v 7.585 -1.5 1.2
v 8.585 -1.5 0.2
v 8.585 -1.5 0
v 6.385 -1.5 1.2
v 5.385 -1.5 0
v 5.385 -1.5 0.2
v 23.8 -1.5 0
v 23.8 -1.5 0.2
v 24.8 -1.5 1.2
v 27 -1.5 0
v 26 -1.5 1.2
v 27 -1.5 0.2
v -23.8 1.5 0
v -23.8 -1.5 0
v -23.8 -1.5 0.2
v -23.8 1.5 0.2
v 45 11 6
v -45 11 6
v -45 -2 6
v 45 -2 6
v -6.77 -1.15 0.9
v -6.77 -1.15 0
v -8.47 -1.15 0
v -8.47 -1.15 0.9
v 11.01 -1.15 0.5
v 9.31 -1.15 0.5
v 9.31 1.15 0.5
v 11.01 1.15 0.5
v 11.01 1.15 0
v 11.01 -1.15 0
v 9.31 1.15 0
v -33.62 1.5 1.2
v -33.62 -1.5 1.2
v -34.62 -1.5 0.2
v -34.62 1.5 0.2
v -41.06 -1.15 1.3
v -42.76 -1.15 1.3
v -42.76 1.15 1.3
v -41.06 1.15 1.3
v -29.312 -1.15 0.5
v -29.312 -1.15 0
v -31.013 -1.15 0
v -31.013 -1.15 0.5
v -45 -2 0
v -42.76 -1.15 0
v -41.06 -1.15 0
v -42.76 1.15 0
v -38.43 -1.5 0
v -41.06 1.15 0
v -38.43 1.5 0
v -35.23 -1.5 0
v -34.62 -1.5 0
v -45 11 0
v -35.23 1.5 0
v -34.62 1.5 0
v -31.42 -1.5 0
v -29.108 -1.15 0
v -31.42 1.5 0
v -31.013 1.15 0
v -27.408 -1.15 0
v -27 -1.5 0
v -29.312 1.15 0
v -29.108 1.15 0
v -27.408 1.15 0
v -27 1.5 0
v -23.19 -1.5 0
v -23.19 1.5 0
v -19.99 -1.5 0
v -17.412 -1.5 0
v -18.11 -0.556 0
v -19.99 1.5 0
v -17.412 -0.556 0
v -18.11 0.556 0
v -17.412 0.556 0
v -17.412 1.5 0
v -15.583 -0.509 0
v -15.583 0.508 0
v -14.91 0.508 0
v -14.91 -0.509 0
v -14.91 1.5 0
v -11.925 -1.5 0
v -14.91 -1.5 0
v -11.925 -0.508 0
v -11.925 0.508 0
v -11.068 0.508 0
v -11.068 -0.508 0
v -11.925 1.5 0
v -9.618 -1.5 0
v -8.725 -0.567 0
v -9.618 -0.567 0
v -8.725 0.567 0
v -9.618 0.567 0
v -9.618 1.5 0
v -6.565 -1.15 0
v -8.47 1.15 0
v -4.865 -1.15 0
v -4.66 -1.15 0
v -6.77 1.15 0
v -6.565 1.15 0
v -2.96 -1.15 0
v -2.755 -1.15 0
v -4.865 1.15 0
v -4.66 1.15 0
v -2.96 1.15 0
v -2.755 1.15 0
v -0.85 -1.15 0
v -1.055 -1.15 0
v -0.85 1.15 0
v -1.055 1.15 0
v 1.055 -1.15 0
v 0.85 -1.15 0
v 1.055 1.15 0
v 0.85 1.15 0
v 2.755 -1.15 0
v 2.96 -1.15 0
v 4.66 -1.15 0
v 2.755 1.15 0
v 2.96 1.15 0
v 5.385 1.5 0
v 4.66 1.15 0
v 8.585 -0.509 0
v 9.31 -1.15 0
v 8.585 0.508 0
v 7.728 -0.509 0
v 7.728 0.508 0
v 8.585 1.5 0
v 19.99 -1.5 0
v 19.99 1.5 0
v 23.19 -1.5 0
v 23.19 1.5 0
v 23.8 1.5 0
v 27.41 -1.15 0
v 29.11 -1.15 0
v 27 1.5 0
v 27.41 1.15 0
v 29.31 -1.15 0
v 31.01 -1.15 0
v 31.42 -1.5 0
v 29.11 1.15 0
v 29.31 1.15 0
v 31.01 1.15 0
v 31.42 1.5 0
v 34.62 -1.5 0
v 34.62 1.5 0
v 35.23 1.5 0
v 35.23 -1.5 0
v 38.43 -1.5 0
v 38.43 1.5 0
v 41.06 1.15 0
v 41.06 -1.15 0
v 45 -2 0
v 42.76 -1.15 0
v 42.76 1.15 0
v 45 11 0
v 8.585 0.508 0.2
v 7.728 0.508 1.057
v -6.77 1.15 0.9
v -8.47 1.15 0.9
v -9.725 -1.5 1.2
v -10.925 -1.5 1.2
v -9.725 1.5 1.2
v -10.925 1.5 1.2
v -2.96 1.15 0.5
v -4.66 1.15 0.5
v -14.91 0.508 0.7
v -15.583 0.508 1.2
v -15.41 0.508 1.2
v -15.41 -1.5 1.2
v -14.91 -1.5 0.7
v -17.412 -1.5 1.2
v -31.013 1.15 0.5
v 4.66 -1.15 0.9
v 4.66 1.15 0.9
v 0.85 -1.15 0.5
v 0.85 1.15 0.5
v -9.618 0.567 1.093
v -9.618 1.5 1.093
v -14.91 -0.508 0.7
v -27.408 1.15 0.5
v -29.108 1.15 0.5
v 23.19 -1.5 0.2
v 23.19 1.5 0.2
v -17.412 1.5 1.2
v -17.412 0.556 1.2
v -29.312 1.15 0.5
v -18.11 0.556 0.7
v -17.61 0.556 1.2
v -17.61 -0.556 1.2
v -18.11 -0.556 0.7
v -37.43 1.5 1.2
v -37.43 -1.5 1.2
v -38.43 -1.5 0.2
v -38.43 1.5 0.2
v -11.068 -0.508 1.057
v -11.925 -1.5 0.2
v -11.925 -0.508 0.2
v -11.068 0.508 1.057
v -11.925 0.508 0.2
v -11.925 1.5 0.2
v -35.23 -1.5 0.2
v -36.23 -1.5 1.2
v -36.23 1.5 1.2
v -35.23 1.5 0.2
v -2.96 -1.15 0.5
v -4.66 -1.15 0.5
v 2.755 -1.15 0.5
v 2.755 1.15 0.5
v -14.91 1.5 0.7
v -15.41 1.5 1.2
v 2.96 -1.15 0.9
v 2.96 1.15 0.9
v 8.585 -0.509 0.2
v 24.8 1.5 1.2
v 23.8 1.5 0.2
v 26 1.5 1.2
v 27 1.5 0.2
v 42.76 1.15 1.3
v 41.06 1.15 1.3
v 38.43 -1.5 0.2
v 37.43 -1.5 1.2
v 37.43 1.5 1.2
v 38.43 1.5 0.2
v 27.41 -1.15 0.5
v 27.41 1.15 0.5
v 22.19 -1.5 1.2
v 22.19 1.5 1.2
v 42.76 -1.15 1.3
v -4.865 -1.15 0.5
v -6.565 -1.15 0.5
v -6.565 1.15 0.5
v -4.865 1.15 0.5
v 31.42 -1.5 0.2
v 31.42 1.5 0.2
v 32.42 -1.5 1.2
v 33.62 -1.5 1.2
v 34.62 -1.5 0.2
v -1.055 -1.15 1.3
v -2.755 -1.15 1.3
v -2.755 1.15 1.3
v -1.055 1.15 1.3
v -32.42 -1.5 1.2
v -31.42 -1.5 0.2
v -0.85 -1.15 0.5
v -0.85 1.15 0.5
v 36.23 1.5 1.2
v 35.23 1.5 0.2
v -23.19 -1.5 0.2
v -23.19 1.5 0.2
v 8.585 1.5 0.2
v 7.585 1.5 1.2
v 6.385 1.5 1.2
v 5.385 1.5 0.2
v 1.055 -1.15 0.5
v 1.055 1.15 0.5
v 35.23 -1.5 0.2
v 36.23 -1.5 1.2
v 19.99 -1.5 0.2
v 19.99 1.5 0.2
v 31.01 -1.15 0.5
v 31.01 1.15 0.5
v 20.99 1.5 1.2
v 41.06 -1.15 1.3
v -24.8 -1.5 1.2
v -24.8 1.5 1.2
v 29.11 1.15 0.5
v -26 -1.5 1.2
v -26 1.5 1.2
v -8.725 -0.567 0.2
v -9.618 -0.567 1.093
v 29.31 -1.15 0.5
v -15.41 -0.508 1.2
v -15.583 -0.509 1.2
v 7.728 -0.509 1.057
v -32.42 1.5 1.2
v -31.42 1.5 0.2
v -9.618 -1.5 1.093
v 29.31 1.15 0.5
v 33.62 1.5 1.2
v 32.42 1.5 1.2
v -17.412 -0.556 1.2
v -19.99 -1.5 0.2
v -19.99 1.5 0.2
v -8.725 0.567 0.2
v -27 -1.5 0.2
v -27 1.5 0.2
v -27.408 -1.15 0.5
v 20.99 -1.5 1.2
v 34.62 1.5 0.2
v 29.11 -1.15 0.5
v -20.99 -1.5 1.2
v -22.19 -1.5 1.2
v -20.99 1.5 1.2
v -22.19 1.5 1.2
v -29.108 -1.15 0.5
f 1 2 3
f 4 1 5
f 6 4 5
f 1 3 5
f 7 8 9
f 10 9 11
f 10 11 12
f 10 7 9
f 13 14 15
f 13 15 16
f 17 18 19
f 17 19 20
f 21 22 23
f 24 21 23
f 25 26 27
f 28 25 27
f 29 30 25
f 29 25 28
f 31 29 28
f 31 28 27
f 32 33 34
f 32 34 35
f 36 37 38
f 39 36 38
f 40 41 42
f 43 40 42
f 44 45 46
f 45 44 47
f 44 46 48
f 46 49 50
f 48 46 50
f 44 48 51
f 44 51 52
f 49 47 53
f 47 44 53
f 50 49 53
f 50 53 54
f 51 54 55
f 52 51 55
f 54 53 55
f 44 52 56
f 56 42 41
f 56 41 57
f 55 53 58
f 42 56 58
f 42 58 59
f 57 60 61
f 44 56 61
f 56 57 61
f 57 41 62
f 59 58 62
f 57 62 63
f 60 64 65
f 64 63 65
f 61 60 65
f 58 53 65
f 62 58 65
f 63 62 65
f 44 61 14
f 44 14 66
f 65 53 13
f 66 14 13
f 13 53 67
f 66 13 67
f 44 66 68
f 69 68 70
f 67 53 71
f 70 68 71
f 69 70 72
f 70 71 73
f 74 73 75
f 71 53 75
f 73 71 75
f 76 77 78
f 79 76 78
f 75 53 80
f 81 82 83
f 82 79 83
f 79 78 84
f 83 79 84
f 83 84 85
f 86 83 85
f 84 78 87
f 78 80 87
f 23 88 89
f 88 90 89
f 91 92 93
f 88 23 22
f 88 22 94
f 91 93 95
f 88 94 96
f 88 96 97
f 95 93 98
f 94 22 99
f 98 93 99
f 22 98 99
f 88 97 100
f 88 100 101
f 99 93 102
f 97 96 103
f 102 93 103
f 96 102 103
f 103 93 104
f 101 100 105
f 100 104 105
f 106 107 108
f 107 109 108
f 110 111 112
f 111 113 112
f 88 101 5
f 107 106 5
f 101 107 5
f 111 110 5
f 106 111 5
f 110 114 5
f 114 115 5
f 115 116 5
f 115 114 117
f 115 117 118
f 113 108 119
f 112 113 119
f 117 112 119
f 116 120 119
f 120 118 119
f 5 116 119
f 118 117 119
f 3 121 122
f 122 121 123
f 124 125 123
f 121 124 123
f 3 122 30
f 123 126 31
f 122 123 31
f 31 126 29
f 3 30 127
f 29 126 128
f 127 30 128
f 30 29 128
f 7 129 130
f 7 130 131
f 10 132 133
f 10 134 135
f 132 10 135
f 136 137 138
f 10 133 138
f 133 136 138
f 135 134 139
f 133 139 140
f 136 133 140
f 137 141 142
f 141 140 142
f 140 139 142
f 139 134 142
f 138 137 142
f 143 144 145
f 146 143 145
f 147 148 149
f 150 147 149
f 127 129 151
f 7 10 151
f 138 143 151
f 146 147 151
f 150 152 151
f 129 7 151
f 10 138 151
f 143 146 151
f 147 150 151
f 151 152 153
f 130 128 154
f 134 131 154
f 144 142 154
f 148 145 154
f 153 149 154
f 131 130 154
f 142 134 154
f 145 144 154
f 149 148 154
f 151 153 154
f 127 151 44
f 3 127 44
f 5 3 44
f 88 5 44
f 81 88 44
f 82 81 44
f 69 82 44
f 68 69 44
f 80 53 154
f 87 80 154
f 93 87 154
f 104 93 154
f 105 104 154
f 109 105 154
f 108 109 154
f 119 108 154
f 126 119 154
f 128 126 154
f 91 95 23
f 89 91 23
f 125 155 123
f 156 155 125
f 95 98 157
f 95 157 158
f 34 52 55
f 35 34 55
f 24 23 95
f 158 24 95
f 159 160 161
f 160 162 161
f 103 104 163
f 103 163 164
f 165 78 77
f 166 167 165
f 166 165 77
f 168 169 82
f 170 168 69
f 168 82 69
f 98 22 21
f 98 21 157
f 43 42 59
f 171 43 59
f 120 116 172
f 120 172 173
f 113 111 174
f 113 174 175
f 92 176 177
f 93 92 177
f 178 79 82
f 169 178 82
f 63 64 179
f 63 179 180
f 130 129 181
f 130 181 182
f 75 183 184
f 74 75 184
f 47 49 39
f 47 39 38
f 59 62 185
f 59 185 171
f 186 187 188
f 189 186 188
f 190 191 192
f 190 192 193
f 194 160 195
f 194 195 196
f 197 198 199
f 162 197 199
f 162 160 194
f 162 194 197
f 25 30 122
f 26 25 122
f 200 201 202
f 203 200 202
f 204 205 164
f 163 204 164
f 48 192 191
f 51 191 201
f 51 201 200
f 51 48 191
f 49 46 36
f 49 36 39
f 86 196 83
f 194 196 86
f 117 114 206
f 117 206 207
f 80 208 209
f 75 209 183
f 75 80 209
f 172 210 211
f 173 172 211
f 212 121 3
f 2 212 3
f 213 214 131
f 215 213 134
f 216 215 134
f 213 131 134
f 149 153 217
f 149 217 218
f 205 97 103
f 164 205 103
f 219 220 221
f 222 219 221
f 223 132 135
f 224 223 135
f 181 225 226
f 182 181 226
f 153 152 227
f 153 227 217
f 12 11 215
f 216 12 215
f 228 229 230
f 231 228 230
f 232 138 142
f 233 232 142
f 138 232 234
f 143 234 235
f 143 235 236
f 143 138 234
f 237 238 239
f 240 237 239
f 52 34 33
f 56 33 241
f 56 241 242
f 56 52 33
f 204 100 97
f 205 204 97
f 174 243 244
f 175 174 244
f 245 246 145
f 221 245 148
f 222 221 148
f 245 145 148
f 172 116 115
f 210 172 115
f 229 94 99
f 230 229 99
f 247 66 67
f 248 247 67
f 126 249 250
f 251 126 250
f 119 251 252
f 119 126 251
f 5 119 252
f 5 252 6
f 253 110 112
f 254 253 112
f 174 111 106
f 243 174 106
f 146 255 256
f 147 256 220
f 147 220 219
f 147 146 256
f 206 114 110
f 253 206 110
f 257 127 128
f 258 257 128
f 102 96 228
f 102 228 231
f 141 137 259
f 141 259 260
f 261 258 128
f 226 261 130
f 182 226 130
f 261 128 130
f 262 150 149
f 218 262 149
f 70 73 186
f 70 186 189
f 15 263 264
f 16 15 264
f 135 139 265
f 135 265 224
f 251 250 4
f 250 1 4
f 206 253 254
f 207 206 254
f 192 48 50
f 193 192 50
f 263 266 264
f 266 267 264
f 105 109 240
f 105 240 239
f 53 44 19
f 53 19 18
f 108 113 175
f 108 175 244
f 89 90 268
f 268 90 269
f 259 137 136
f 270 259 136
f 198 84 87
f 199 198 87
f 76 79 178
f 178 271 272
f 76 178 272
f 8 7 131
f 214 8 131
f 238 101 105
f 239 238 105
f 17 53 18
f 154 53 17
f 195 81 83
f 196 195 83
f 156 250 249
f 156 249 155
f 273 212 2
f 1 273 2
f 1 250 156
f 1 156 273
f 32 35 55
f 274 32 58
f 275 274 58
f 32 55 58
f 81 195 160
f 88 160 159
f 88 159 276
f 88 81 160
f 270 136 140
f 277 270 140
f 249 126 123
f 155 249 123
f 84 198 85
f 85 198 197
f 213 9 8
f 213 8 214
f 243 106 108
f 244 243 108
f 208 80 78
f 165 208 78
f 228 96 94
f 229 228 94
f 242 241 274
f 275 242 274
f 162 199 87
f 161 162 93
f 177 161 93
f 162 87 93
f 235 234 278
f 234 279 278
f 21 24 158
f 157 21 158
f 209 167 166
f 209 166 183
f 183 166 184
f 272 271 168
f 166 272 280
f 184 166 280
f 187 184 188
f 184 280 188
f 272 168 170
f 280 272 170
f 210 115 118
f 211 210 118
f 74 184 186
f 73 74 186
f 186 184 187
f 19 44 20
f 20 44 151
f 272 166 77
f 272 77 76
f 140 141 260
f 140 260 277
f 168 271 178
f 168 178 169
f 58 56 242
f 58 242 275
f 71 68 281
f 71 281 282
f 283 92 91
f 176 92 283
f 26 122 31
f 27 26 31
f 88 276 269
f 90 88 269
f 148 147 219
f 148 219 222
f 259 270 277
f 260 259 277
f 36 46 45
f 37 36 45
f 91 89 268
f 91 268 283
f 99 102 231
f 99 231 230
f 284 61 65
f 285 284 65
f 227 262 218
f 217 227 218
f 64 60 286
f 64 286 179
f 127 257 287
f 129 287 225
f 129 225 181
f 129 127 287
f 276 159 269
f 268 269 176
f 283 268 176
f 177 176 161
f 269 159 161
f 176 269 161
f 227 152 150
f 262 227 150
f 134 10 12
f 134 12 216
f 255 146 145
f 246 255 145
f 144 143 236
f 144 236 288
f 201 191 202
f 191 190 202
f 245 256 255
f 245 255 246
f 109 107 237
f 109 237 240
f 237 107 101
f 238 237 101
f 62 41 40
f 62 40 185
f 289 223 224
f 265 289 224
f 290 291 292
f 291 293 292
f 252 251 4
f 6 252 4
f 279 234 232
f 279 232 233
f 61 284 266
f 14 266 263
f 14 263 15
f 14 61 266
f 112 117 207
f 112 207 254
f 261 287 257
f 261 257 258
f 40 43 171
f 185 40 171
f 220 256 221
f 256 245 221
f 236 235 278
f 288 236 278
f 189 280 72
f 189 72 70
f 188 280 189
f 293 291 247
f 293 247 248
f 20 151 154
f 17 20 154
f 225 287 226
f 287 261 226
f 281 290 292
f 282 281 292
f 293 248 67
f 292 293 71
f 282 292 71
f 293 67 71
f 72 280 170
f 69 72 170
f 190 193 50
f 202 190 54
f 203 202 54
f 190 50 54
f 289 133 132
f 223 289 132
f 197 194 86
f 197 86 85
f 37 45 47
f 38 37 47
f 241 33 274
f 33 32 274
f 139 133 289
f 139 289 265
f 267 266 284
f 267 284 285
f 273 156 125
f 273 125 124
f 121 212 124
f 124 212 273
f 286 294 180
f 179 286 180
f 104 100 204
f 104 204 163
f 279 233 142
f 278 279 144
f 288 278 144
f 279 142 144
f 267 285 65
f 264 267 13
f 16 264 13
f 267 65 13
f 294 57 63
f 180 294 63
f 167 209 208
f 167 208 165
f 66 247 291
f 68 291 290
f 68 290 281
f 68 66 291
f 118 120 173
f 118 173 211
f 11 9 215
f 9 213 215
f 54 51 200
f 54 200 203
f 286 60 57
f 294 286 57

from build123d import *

# Parameters (mm, degrees)
SKETCH040_W             = 2.3
SKETCH040_H             = 1.7
PAD037_DEPTH            = 1.3
BODY038_PLACEMENT_ANGLE = 90
SKETCH031_W             = 3.2
SKETCH031_H             = 3
PAD028_DEPTH            = 1.2
CHAMFER014_SIZE         = 1
SKETCH030_W             = 3.2
SKETCH030_H             = 3
PAD027_DEPTH            = 1.2
CHAMFER013_SIZE         = 1
SKETCH037_W             = 2.3
SKETCH037_H             = 1.7
PAD034_DEPTH            = 0.5
BODY035_PLACEMENT_ANGLE = 90
SKETCH036_W             = 2.3
SKETCH036_H             = 1.7
PAD033_DEPTH            = 0.5
BODY034_PLACEMENT_ANGLE = 90
SKETCH028_W             = 3.2
SKETCH028_H             = 3
PAD025_DEPTH            = 1.2
CHAMFER011_SIZE         = 1
SKETCH029_W             = 3.2
SKETCH029_H             = 3
PAD026_DEPTH            = 1.2
CHAMFER012_SIZE         = 1
SKETCH054_W             = 3.2
SKETCH054_H             = 3
PAD049_DEPTH            = 1.2
CHAMFER021_SIZE         = 0.5
SKETCH055_W             = 1.850896
SKETCH055_H             = 1.017
SKETCH055_W_2           = 1.709498
SKETCH055_H_2           = 1.155216
POCKET005_DEPTH         = 5
BODY050_PLACEMENT_ANGLE = 180
SKETCH052_W             = 3.2
SKETCH052_H             = 3
PAD048_DEPTH            = 1.2
CHAMFER020_SIZE         = 1
SKETCH053_W             = 2.017963
SKETCH053_H             = 1.017
SKETCH053_W_2           = 1.827715
SKETCH053_H_2           = 1.155216
POCKET004_DEPTH         = 5
SKETCH048_W             = 2.3
SKETCH048_H             = 1.7
PAD045_DEPTH            = 0.9
BODY046_PLACEMENT_ANGLE = 90
SKETCH045_W             = 2.3
SKETCH045_H             = 1.7
PAD042_DEPTH            = 0.5
BODY043_PLACEMENT_ANGLE = 90
SKETCH044_W             = 2.3
SKETCH044_H             = 1.7
PAD041_DEPTH            = 0.5
BODY042_PLACEMENT_ANGLE = 90
SKETCH046_W             = 2.3
SKETCH046_H             = 1.7
PAD043_DEPTH            = 1.3
BODY044_PLACEMENT_ANGLE = 90
SKETCH049_W             = 2.3
SKETCH049_H             = 1.7
PAD046_DEPTH            = 0.9
BODY047_PLACEMENT_ANGLE = 90
SKETCH050_W             = 3.2
SKETCH050_H             = 3
PAD047_DEPTH            = 1.2
CHAMFER019_SIZE         = 1
SKETCH051_W             = 2.017963
SKETCH051_H             = 1.017
POCKET003_DEPTH         = 5
BODY048_PLACEMENT_ANGLE = 180
SKETCH042_W             = 2.3
SKETCH042_H             = 1.7
PAD039_DEPTH            = 0.5
BODY040_PLACEMENT_ANGLE = 90
SKETCH043_W             = 2.3
SKETCH043_H             = 1.7
PAD040_DEPTH            = 0.5
BODY041_PLACEMENT_ANGLE = 90
SKETCH047_W             = 2.3
SKETCH047_H             = 1.7
PAD044_DEPTH            = 0.5
BODY045_PLACEMENT_ANGLE = 90
SKETCH034_W             = 3.2
SKETCH034_H             = 3
PAD030_DEPTH            = 1.2
CHAMFER017_SIZE         = 1
SKETCH033_W             = 3.2
SKETCH033_H             = 3
PAD029_DEPTH            = 1.2
CHAMFER018_SIZE         = 1
SKETCH039_W             = 2.3
SKETCH039_H             = 1.7
PAD035_DEPTH            = 0.5
BODY037_PLACEMENT_ANGLE = 90
SKETCH038_W             = 2.3
SKETCH038_H             = 1.7
PAD036_DEPTH            = 0.5
BODY036_PLACEMENT_ANGLE = 90
SKETCH035_W             = 3.2
SKETCH035_H             = 3
PAD031_DEPTH            = 1.2
CHAMFER016_SIZE         = 1
SKETCH032_W             = 3.2
SKETCH032_H             = 3
PAD032_DEPTH            = 1.2
CHAMFER015_SIZE         = 1
SKETCH041_W             = 2.3
SKETCH041_H             = 1.7
PAD038_DEPTH            = 1.3
BODY039_PLACEMENT_ANGLE = 90
SKETCH056_W             = 90
SKETCH056_H             = 13
PAD050_DEPTH            = 6


with BuildPart() as capacitor_1u003:
    # Sketch040 → Pad037 (new body)
    with BuildSketch(Plane.XY):
        Rectangle(SKETCH040_W, SKETCH040_H)
    extrude(amount=PAD037_DEPTH)


with BuildPart() as capacitor_1u003_1:
    # Body038 placement: moved
    add(capacitor_1u003.part.moved(Location((-41.91, 0, 0))).rotate(Axis((-41.91, 0, 0), (0, 0, 1)), BODY038_PLACEMENT_ANGLE))


with BuildPart() as supersot017:
    # Sketch031 → Pad028 (new body)
    with BuildSketch(Plane.XY):
        Rectangle(SKETCH031_W, SKETCH031_H)
    extrude(amount=PAD028_DEPTH)

    # Chamfer014
    chamfer014_edges = [supersot017.edges().sort_by_distance(p)[0] for p in [
        (-1.6, 0, 1.2),
        (1.6, 0, 1.2),
    ]]
    chamfer(chamfer014_edges, length=CHAMFER014_SIZE)


with BuildPart() as supersot017_1:
    # Body029 placement: moved
    add(supersot017.part.moved(Location((-36.83, 0, 0))))


with BuildPart() as supersot016:
    # Sketch030 → Pad027 (new body)
    with BuildSketch(Plane.XY):
        Rectangle(SKETCH030_W, SKETCH030_H)
    extrude(amount=PAD027_DEPTH)

    # Chamfer013
    chamfer013_edges = [supersot016.edges().sort_by_distance(p)[0] for p in [
        (-1.6, 0, 1.2),
        (1.6, 0, 1.2),
    ]]
    chamfer(chamfer013_edges, length=CHAMFER013_SIZE)


with BuildPart() as supersot016_1:
    # Body028 placement: moved
    add(supersot016.part.moved(Location((-33.02, 0, 0))))


with BuildPart() as resistor_10k010:
    # Sketch037 → Pad034 (new body)
    with BuildSketch(Plane.XY):
        Rectangle(SKETCH037_W, SKETCH037_H)
    extrude(amount=PAD034_DEPTH)


with BuildPart() as resistor_10k010_1:
    # Body035 placement: moved
    add(resistor_10k010.part.moved(Location((-30.1625, 0, 0))).rotate(Axis((-30.1625, 0, 0), (0, 0, 1)), BODY035_PLACEMENT_ANGLE))


with BuildPart() as resistor_10k009:
    # Sketch036 → Pad033 (new body)
    with BuildSketch(Plane.XY):
        Rectangle(SKETCH036_W, SKETCH036_H)
    extrude(amount=PAD033_DEPTH)


with BuildPart() as resistor_10k009_1:
    # Body034 placement: moved
    add(resistor_10k009.part.moved(Location((-28.2575, 0, 0))).rotate(Axis((-28.2575, 0, 0), (0, 0, 1)), BODY034_PLACEMENT_ANGLE))


with BuildPart() as supersot014:
    # Sketch028 → Pad025 (new body)
    with BuildSketch(Plane.XY):
        Rectangle(SKETCH028_W, SKETCH028_H)
    extrude(amount=PAD025_DEPTH)

    # Chamfer011
    chamfer011_edges = [supersot014.edges().sort_by_distance(p)[0] for p in [
        (-1.6, 0, 1.2),
        (1.6, 0, 1.2),
    ]]
    chamfer(chamfer011_edges, length=CHAMFER011_SIZE)


with BuildPart() as supersot014_1:
    # Body026 placement: moved
    add(supersot014.part.moved(Location((-25.4, 0, 0))))


with BuildPart() as supersot015:
    # Sketch029 → Pad026 (new body)
    with BuildSketch(Plane.XY):
        Rectangle(SKETCH029_W, SKETCH029_H)
    extrude(amount=PAD026_DEPTH)

    # Chamfer012
    chamfer012_edges = [supersot015.edges().sort_by_distance(p)[0] for p in [
        (-1.6, 0, 1.2),
        (1.6, 0, 1.2),
    ]]
    chamfer(chamfer012_edges, length=CHAMFER012_SIZE)


with BuildPart() as supersot015_1:
    # Body027 placement: moved
    add(supersot015.part.moved(Location((-21.59, 0, 0))))


with BuildPart() as sot23_big001:
    # Sketch054 → Pad049 (new body)
    with BuildSketch(Plane.XY):
        Rectangle(SKETCH054_W, SKETCH054_H)
    extrude(amount=PAD049_DEPTH)

    # Chamfer021
    chamfer021_edges = [sot23_big001.edges().sort_by_distance(p)[0] for p in [
        (-1.6, 0, 1.2),
        (1.6, 0, 1.2),
    ]]
    chamfer(chamfer021_edges, length=CHAMFER021_SIZE)

    # Sketch055 (on Face5 of Chamfer021) → Pocket005 (cut)
    with BuildSketch(Plane.XY.offset(1.2)):
        with Locations((-1.851985, 0)):
            Rectangle(SKETCH055_W, SKETCH055_H)
        with Locations((1.75658, 1.133439)):
            Rectangle(SKETCH055_W_2, SKETCH055_H_2)
        with Locations((1.75658, -1.133439)):
            Rectangle(SKETCH055_W_2, SKETCH055_H_2)
    extrude(amount=-POCKET005_DEPTH, mode=Mode.SUBTRACT)


with BuildPart() as sot23_big001_1:
    # Body050 placement: moved
    add(sot23_big001.part.moved(Location((-16.51, 0, 0))).rotate(Axis((-16.51, 0, 0), (0, 0, 1)), BODY050_PLACEMENT_ANGLE))


with BuildPart() as sot23:
    # Sketch052 → Pad048 (new body)
    with BuildSketch(Plane.XY):
        Rectangle(SKETCH052_W, SKETCH052_H)
    extrude(amount=PAD048_DEPTH)

    # Chamfer020
    chamfer020_edges = [sot23.edges().sort_by_distance(p)[0] for p in [
        (-1.6, 0, 1.2),
        (1.6, 0, 1.2),
    ]]
    chamfer(chamfer020_edges, length=CHAMFER020_SIZE)

    # Sketch053 (on Face5 of Chamfer020) → Pocket004 (cut)
    with BuildSketch(Plane.XY.offset(1.2)):
        with Locations((-1.75199, 0)):
            Rectangle(SKETCH053_W, SKETCH053_H)
        with Locations((1.620688, 1.144909)):
            Rectangle(SKETCH053_W_2, SKETCH053_H_2)
        with Locations((1.620688, -1.144909)):
            Rectangle(SKETCH053_W_2, SKETCH053_H_2)
    extrude(amount=-POCKET004_DEPTH, mode=Mode.SUBTRACT)


with BuildPart() as sot23_1:
    # Body049 placement: moved
    add(sot23.part.moved(Location((-10.3251, 0, 0))))


with BuildPart() as capacitor_100n002:
    # Sketch048 → Pad045 (new body)
    with BuildSketch(Plane.XY):
        Rectangle(SKETCH048_W, SKETCH048_H)
    extrude(amount=PAD045_DEPTH)


with BuildPart() as capacitor_100n002_1:
    # Body046 placement: moved
    add(capacitor_100n002.part.moved(Location((-7.62, 0, 0))).rotate(Axis((-7.62, 0, 0), (0, 0, 1)), BODY046_PLACEMENT_ANGLE))


with BuildPart() as resistor_10k016:
    # Sketch045 → Pad042 (new body)
    with BuildSketch(Plane.XY):
        Rectangle(SKETCH045_W, SKETCH045_H)
    extrude(amount=PAD042_DEPTH)


with BuildPart() as resistor_10k016_1:
    # Body043 placement: moved
    add(resistor_10k016.part.moved(Location((-5.715, 0, 0))).rotate(Axis((-5.715, 0, 0), (0, 0, 1)), BODY043_PLACEMENT_ANGLE))


with BuildPart() as resistor_10k015:
    # Sketch044 → Pad041 (new body)
    with BuildSketch(Plane.XY):
        Rectangle(SKETCH044_W, SKETCH044_H)
    extrude(amount=PAD041_DEPTH)


with BuildPart() as resistor_10k015_1:
    # Body042 placement: moved
    add(resistor_10k015.part.moved(Location((-3.81, 0, 0))).rotate(Axis((-3.81, 0, 0), (0, 0, 1)), BODY042_PLACEMENT_ANGLE))


with BuildPart() as capacitor_1u005:
    # Sketch046 → Pad043 (new body)
    with BuildSketch(Plane.XY):
        Rectangle(SKETCH046_W, SKETCH046_H)
    extrude(amount=PAD043_DEPTH)


with BuildPart() as capacitor_1u005_1:
    # Body044 placement: moved
    add(capacitor_1u005.part.moved(Location((-1.905, 0, 0))).rotate(Axis((-1.905, 0, 0), (0, 0, 1)), BODY044_PLACEMENT_ANGLE))


with BuildPart() as capacitor_100n003:
    # Sketch049 → Pad046 (new body)
    with BuildSketch(Plane.XY):
        Rectangle(SKETCH049_W, SKETCH049_H)
    extrude(amount=PAD046_DEPTH)


with BuildPart() as capacitor_100n003_1:
    # Body047 placement: moved
    add(capacitor_100n003.part.moved(Location((3.81, 0, 0))).rotate(Axis((3.81, 0, 0), (0, 0, 1)), BODY047_PLACEMENT_ANGLE))


with BuildPart() as body048:
    # Sketch050 → Pad047 (new body)
    with BuildSketch(Plane.XY):
        Rectangle(SKETCH050_W, SKETCH050_H)
    extrude(amount=PAD047_DEPTH)

    # Chamfer019
    chamfer019_edges = [body048.edges().sort_by_distance(p)[0] for p in [
        (-1.6, 0, 1.2),
        (1.6, 0, 1.2),
    ]]
    chamfer(chamfer019_edges, length=CHAMFER019_SIZE)

    # Sketch051 (on Face5 of Chamfer019) → Pocket003 (cut)
    with BuildSketch(Plane.XY.offset(1.2)):
        with Locations((-1.75199, 0)):
            Rectangle(SKETCH051_W, SKETCH051_H)
    extrude(amount=-POCKET003_DEPTH, mode=Mode.SUBTRACT)


with BuildPart() as body048_1:
    # Body048 placement: moved
    add(body048.part.moved(Location((6.985, 0, 0))).rotate(Axis((6.985, 0, 0), (0, 0, 1)), BODY048_PLACEMENT_ANGLE))


with BuildPart() as resistor_10k013:
    # Sketch042 → Pad039 (new body)
    with BuildSketch(Plane.XY):
        Rectangle(SKETCH042_W, SKETCH042_H)
    extrude(amount=PAD039_DEPTH)


with BuildPart() as resistor_10k013_1:
    # Body040 placement: moved
    add(resistor_10k013.part.rotate(Axis((0, 0, 0), (0, 0, 1)), BODY040_PLACEMENT_ANGLE))


with BuildPart() as resistor_10k014:
    # Sketch043 → Pad040 (new body)
    with BuildSketch(Plane.XY):
        Rectangle(SKETCH043_W, SKETCH043_H)
    extrude(amount=PAD040_DEPTH)


with BuildPart() as resistor_10k014_1:
    # Body041 placement: moved
    add(resistor_10k014.part.moved(Location((1.905, 0, 0))).rotate(Axis((1.905, 0, 0), (0, 0, 1)), BODY041_PLACEMENT_ANGLE))


with BuildPart() as resistor_10k017:
    # Sketch047 → Pad044 (new body)
    with BuildSketch(Plane.XY):
        Rectangle(SKETCH047_W, SKETCH047_H)
    extrude(amount=PAD044_DEPTH)


with BuildPart() as resistor_10k017_1:
    # Body045 placement: moved
    add(resistor_10k017.part.moved(Location((10.16, 0, 0))).rotate(Axis((10.16, 0, 0), (0, 0, 1)), BODY045_PLACEMENT_ANGLE))


with BuildPart() as supersot019:
    # Sketch034 → Pad030 (new body)
    with BuildSketch(Plane.XY):
        Rectangle(SKETCH034_W, SKETCH034_H)
    extrude(amount=PAD030_DEPTH)

    # Chamfer017
    chamfer017_edges = [supersot019.edges().sort_by_distance(p)[0] for p in [
        (-1.6, 0, 1.2),
        (1.6, 0, 1.2),
    ]]
    chamfer(chamfer017_edges, length=CHAMFER017_SIZE)


with BuildPart() as supersot019_1:
    # Body031 placement: moved
    add(supersot019.part.moved(Location((21.59, 0, 0))))


with BuildPart() as supersot018:
    # Sketch033 → Pad029 (new body)
    with BuildSketch(Plane.XY):
        Rectangle(SKETCH033_W, SKETCH033_H)
    extrude(amount=PAD029_DEPTH)

    # Chamfer018
    chamfer018_edges = [supersot018.edges().sort_by_distance(p)[0] for p in [
        (-1.6, 0, 1.2),
        (1.6, 0, 1.2),
    ]]
    chamfer(chamfer018_edges, length=CHAMFER018_SIZE)


with BuildPart() as supersot018_1:
    # Body030 placement: moved
    add(supersot018.part.moved(Location((25.4, 0, 0))))


with BuildPart() as resistor_10k012:
    # Sketch039 → Pad035 (new body)
    with BuildSketch(Plane.XY):
        Rectangle(SKETCH039_W, SKETCH039_H)
    extrude(amount=PAD035_DEPTH)


with BuildPart() as resistor_10k012_1:
    # Body037 placement: moved
    add(resistor_10k012.part.moved(Location((28.26, 0, 0))).rotate(Axis((28.26, 0, 0), (0, 0, 1)), BODY037_PLACEMENT_ANGLE))


with BuildPart() as resistor_10k011:
    # Sketch038 → Pad036 (new body)
    with BuildSketch(Plane.XY):
        Rectangle(SKETCH038_W, SKETCH038_H)
    extrude(amount=PAD036_DEPTH)


with BuildPart() as resistor_10k011_1:
    # Body036 placement: moved
    add(resistor_10k011.part.moved(Location((30.16, 0, 0))).rotate(Axis((30.16, 0, 0), (0, 0, 1)), BODY036_PLACEMENT_ANGLE))


with BuildPart() as supersot020:
    # Sketch035 → Pad031 (new body)
    with BuildSketch(Plane.XY):
        Rectangle(SKETCH035_W, SKETCH035_H)
    extrude(amount=PAD031_DEPTH)

    # Chamfer016
    chamfer016_edges = [supersot020.edges().sort_by_distance(p)[0] for p in [
        (-1.6, 0, 1.2),
        (1.6, 0, 1.2),
    ]]
    chamfer(chamfer016_edges, length=CHAMFER016_SIZE)


with BuildPart() as supersot020_1:
    # Body032 placement: moved
    add(supersot020.part.moved(Location((33.02, 0, 0))))


with BuildPart() as supersot021:
    # Sketch032 → Pad032 (new body)
    with BuildSketch(Plane.XY):
        Rectangle(SKETCH032_W, SKETCH032_H)
    extrude(amount=PAD032_DEPTH)

    # Chamfer015
    chamfer015_edges = [supersot021.edges().sort_by_distance(p)[0] for p in [
        (-1.6, 0, 1.2),
        (1.6, 0, 1.2),
    ]]
    chamfer(chamfer015_edges, length=CHAMFER015_SIZE)


with BuildPart() as supersot021_1:
    # Body033 placement: moved
    add(supersot021.part.moved(Location((36.83, 0, 0))))


with BuildPart() as capacitor_1u004:
    # Sketch041 → Pad038 (new body)
    with BuildSketch(Plane.XY):
        Rectangle(SKETCH041_W, SKETCH041_H)
    extrude(amount=PAD038_DEPTH)


with BuildPart() as capacitor_1u004_1:
    # Body039 placement: moved
    add(capacitor_1u004.part.moved(Location((41.91, 0, 0))).rotate(Axis((41.91, 0, 0), (0, 0, 1)), BODY039_PLACEMENT_ANGLE))


with BuildPart() as body025:
    # Sketch056 → Pad050 (new body)
    with BuildSketch(Plane.XY):
        with Locations((0, 4.5)):
            Rectangle(SKETCH056_W, SKETCH056_H)
    extrude(amount=PAD050_DEPTH)

    # Boolean: cut Capacitor 1u003, Supersot017, Supersot016, Resistor 10k010, Resistor 10k009, Supersot014, Supersot015, Sot23-big001, Sot23, Capacitor 100n002, Resistor 10k016, Resistor 10k015, Capacitor 1u005, Capacitor 100n003, Body048, Resistor 10k013, Resistor 10k014, Resistor 10k017, Supersot019, Supersot018, Resistor 10k012, Resistor 10k011, Supersot020, Supersot021, Capacitor 1u004
    add(capacitor_1u003_1.part, mode=Mode.SUBTRACT)
    add(supersot017_1.part, mode=Mode.SUBTRACT)
    add(supersot016_1.part, mode=Mode.SUBTRACT)
    add(resistor_10k010_1.part, mode=Mode.SUBTRACT)
    add(resistor_10k009_1.part, mode=Mode.SUBTRACT)
    add(supersot014_1.part, mode=Mode.SUBTRACT)
    add(supersot015_1.part, mode=Mode.SUBTRACT)
    add(sot23_big001_1.part, mode=Mode.SUBTRACT)
    add(sot23_1.part, mode=Mode.SUBTRACT)
    add(capacitor_100n002_1.part, mode=Mode.SUBTRACT)
    add(resistor_10k016_1.part, mode=Mode.SUBTRACT)
    add(resistor_10k015_1.part, mode=Mode.SUBTRACT)
    add(capacitor_1u005_1.part, mode=Mode.SUBTRACT)
    add(capacitor_100n003_1.part, mode=Mode.SUBTRACT)
    add(body048_1.part, mode=Mode.SUBTRACT)
    add(resistor_10k013_1.part, mode=Mode.SUBTRACT)
    add(resistor_10k014_1.part, mode=Mode.SUBTRACT)
    add(resistor_10k017_1.part, mode=Mode.SUBTRACT)
    add(supersot019_1.part, mode=Mode.SUBTRACT)
    add(supersot018_1.part, mode=Mode.SUBTRACT)
    add(resistor_10k012_1.part, mode=Mode.SUBTRACT)
    add(resistor_10k011_1.part, mode=Mode.SUBTRACT)
    add(supersot020_1.part, mode=Mode.SUBTRACT)
    add(supersot021_1.part, mode=Mode.SUBTRACT)
    add(capacitor_1u004_1.part, mode=Mode.SUBTRACT)


solid = body025.part
